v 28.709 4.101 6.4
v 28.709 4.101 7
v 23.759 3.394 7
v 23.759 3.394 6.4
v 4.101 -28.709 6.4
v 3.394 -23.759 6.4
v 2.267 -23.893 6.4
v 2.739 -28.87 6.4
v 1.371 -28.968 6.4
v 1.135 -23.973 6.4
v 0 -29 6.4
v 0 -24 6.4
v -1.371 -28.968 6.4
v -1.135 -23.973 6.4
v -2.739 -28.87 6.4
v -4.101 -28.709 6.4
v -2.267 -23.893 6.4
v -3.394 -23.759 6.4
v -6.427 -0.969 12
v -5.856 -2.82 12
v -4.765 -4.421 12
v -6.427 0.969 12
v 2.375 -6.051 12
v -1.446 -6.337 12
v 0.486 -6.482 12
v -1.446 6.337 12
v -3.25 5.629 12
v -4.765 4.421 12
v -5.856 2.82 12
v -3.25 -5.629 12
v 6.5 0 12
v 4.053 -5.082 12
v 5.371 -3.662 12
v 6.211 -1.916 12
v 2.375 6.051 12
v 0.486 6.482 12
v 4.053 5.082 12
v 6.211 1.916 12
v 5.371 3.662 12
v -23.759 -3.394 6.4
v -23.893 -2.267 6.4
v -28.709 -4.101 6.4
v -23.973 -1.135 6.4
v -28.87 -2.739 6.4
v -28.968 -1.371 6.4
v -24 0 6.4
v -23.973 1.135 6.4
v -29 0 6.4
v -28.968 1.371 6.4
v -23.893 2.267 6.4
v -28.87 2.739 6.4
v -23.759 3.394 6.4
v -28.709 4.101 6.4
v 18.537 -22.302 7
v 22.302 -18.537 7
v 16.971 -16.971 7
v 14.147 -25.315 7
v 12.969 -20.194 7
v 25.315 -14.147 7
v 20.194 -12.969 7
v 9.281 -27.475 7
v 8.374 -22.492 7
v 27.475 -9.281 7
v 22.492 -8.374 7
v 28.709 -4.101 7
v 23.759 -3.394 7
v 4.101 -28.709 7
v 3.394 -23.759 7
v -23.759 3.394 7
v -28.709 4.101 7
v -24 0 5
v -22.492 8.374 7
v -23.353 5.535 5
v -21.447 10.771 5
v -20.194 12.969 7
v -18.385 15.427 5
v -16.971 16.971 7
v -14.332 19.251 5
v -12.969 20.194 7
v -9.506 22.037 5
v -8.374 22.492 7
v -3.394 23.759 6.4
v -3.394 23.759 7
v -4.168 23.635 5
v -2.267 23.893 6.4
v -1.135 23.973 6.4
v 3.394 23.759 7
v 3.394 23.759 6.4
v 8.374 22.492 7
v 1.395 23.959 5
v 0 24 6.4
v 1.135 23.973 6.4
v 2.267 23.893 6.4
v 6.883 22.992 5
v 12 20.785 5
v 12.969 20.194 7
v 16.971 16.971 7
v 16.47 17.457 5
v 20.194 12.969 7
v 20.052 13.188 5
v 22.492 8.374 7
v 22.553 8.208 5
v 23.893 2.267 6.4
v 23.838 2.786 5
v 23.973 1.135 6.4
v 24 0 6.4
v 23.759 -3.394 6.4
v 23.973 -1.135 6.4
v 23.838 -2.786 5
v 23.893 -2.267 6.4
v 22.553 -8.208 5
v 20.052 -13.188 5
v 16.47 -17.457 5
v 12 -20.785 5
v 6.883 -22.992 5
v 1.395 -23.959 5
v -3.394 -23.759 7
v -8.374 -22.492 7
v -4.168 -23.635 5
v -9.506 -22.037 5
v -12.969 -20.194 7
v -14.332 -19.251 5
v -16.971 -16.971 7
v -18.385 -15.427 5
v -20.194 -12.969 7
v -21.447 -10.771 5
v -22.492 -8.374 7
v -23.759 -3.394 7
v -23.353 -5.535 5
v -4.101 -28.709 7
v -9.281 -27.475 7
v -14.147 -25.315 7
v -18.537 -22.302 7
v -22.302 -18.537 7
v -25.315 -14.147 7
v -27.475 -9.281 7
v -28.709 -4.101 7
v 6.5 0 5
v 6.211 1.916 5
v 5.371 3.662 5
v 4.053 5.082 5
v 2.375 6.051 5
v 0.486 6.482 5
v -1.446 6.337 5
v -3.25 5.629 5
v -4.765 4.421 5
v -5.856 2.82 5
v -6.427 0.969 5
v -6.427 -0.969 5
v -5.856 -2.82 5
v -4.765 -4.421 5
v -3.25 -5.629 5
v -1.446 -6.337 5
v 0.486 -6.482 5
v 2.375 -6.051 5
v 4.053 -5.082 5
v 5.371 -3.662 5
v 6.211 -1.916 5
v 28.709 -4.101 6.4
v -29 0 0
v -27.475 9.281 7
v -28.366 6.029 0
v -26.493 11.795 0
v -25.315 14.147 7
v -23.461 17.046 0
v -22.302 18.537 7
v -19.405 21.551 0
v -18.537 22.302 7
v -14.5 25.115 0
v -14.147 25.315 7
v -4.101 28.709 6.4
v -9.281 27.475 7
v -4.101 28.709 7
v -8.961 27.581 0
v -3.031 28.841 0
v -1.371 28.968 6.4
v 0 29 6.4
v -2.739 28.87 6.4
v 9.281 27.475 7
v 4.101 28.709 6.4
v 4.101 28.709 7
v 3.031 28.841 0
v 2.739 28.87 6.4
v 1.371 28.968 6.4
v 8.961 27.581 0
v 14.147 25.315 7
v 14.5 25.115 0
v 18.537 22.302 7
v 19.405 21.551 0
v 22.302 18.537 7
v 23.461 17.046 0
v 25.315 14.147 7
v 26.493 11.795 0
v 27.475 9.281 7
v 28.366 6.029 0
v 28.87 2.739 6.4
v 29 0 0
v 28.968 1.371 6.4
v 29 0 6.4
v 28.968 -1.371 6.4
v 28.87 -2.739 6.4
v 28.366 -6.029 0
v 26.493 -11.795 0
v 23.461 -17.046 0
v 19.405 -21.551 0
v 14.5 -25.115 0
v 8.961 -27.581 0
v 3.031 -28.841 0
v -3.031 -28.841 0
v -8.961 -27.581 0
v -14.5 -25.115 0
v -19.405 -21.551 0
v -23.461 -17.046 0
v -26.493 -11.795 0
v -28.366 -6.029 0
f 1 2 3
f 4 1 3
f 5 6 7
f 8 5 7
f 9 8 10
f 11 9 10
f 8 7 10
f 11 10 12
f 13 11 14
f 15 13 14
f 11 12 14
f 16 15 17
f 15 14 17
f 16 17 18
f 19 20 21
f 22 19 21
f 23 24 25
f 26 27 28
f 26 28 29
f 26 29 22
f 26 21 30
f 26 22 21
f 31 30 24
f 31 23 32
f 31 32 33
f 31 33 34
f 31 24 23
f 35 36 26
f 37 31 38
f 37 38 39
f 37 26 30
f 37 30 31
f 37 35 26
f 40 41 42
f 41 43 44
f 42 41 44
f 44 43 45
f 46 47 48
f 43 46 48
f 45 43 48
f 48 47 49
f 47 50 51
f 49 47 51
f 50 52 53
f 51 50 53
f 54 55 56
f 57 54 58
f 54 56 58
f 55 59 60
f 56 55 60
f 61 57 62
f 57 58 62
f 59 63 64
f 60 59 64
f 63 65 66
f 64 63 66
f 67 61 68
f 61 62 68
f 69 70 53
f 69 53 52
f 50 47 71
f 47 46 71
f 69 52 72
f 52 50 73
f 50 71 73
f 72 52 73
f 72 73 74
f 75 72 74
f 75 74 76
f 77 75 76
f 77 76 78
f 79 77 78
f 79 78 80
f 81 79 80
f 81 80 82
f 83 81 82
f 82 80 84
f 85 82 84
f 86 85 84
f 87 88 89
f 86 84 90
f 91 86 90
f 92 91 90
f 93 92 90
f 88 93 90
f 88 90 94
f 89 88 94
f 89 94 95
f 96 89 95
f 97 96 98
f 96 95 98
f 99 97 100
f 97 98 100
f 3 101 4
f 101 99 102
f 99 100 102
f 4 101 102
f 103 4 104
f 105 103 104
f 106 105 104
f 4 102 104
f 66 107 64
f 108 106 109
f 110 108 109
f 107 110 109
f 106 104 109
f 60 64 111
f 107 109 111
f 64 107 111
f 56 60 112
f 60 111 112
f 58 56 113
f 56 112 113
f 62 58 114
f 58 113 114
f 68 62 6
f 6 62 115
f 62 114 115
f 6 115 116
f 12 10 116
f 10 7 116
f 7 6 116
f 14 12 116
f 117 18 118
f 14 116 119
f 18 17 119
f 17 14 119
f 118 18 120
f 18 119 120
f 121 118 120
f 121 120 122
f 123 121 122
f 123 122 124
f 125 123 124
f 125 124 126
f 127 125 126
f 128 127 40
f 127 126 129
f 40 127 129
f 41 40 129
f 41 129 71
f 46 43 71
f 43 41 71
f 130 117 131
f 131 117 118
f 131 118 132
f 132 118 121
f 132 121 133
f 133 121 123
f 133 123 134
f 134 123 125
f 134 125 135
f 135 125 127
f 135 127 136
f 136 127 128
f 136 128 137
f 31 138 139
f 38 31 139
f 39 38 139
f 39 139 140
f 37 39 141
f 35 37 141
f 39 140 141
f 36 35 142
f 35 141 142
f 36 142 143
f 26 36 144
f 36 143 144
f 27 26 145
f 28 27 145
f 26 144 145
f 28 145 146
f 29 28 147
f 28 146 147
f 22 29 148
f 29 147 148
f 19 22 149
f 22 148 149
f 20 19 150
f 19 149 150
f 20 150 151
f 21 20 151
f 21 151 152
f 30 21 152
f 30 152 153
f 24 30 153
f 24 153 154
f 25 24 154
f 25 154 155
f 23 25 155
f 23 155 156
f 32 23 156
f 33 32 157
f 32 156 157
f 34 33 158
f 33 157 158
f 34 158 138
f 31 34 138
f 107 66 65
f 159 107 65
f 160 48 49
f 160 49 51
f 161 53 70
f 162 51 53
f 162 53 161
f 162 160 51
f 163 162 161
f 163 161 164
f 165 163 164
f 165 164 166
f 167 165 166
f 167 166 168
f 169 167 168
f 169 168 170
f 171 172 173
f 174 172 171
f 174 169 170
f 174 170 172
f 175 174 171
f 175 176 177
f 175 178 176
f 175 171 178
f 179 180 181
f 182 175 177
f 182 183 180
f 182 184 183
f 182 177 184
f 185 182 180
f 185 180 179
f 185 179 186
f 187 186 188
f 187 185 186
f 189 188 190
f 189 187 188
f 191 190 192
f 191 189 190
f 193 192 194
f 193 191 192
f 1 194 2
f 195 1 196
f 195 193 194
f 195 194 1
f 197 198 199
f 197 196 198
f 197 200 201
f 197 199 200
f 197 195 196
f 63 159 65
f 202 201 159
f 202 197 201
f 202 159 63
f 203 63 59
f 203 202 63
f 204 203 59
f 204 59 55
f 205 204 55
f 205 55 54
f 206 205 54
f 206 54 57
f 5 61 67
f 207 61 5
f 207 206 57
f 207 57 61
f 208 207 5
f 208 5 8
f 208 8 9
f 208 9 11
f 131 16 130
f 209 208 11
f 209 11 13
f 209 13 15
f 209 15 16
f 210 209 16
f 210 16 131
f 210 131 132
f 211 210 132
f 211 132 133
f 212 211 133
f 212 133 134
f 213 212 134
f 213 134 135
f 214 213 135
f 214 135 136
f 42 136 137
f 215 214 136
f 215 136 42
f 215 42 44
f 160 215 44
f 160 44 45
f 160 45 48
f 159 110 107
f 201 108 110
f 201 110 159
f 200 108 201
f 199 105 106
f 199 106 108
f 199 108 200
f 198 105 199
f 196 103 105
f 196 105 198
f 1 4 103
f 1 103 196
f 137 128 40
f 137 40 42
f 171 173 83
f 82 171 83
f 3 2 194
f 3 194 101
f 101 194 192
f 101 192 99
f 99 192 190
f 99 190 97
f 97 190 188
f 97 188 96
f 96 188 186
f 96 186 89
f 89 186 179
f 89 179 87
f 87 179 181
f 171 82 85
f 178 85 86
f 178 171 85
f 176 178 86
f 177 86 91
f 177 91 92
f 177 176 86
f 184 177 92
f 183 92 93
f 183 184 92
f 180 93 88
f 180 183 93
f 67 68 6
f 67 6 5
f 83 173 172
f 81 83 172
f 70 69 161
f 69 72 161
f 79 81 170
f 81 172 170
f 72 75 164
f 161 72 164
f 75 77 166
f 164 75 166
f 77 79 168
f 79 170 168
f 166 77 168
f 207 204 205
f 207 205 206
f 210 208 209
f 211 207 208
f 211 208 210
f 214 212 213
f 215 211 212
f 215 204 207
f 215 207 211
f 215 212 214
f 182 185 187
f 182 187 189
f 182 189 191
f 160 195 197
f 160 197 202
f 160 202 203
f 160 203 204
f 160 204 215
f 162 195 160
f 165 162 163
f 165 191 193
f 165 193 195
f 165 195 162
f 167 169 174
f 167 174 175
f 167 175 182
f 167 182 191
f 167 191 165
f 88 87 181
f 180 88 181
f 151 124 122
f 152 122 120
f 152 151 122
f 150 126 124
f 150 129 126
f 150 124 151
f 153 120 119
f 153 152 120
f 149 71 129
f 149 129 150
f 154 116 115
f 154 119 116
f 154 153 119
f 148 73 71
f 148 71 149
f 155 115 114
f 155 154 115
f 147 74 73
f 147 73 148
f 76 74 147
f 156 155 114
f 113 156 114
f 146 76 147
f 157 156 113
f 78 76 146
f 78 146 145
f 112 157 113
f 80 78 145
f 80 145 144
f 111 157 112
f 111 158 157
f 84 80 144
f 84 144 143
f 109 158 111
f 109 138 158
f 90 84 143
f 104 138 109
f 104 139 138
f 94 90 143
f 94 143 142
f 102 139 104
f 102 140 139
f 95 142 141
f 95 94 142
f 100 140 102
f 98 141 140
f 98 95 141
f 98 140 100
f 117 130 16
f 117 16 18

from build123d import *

# Parameters (mm, degrees)
SKETCH1_R          = 24
EXTRUDE1_DEPTH     = 5
SKETCH2_R          = 6.5
EXTRUDE2_DEPTH     = 7
SKETCH3_R          = 29
SKETCH3_R_2        = 24
EXTRUDE3_DEPTH     = 7
CUT_EXTRUDE1_DEPTH = 0.6


with BuildPart() as part:
    # Sketch1 → Extrude1 (new body)
    with BuildSketch(Plane.XY):
        Circle(SKETCH1_R)
    extrude(amount=EXTRUDE1_DEPTH)

    # Sketch2 → Extrude2 (add)
    with BuildSketch(Plane.XY.offset(5)):
        Circle(SKETCH2_R)
    extrude(amount=EXTRUDE2_DEPTH)

    # Sketch3 → Extrude3 (add)
    with BuildSketch(Plane(origin=(0, 0, 0), x_dir=(-1, 0, 0), z_dir=(0, 0, -1))):
        Circle(SKETCH3_R)
        Circle(SKETCH3_R_2, mode=Mode.SUBTRACT)
    extrude(amount=-EXTRUDE3_DEPTH)

    # Sketch4 → Cut-Extrude1 (cut)
    with BuildSketch(Plane.XY.offset(7)):
        with BuildLine():
            Line((3.39411255, 23.758787848), (4.101219331, 28.708535316))
            ThreePointArc((4.101219331, 28.708535316), (2.055781583, 28.927042056), (0, 29))
            ThreePointArc((0, 29), (-2.055781583, 28.927042056), (-4.101219331, 28.708535316))
            Line((-4.101219331, 28.708535316), (-3.39411255, 23.758787848))
            ThreePointArc((-3.39411255, 23.758787848), (-1.701336482, 23.939621012), (0, 24))
            ThreePointArc((0, 24), (1.701336482, 23.939621012), (3.39411255, 23.758787848))
        make_face()
        with BuildLine():
            Line((23.758787848, -3.39411255), (28.708535316, -4.101219331))
            ThreePointArc((28.708535316, -4.101219331), (28.927042056, -2.055781583), (29, 0))
            ThreePointArc((29, 0), (28.927042056, 2.055781583), (28.708535316, 4.101219331))
            Line((28.708535316, 4.101219331), (23.758787848, 3.39411255))
            ThreePointArc((23.758787848, 3.39411255), (23.939621012, 1.701336482), (24, 0))
            ThreePointArc((24, 0), (23.939621012, -1.701336482), (23.758787848, -3.39411255))
        make_face()
        with BuildLine():
            Line((3.39411255, -23.758787848), (4.101219331, -28.708535316))
            ThreePointArc((4.101219331, -28.708535316), (2.055781583, -28.927042056), (0, -29))
            ThreePointArc((0, -29), (-2.055781583, -28.927042056), (-4.101219331, -28.708535316))
            Line((-4.101219331, -28.708535316), (-3.39411255, -23.758787848))
            ThreePointArc((-3.39411255, -23.758787848), (-1.701336482, -23.939621012), (0, -24))
            ThreePointArc((0, -24), (1.701336482, -23.939621012), (3.39411255, -23.758787848))
        make_face()
        with BuildLine():
            Line((-23.758787848, -3.39411255), (-28.708535316, -4.101219331))
            ThreePointArc((-28.708535316, -4.101219331), (-28.927042056, -2.055781583), (-29, 0))
            ThreePointArc((-29, 0), (-28.927042056, 2.055781583), (-28.708535316, 4.101219331))
            Line((-28.708535316, 4.101219331), (-23.758787848, 3.39411255))
            ThreePointArc((-23.758787848, 3.39411255), (-23.939621012, 1.701336482), (-24, 0))
            ThreePointArc((-24, 0), (-23.939621012, -1.701336482), (-23.758787848, -3.39411255))
        make_face()
    extrude(amount=-CUT_EXTRUDE1_DEPTH, mode=Mode.SUBTRACT)


solid = part.part
